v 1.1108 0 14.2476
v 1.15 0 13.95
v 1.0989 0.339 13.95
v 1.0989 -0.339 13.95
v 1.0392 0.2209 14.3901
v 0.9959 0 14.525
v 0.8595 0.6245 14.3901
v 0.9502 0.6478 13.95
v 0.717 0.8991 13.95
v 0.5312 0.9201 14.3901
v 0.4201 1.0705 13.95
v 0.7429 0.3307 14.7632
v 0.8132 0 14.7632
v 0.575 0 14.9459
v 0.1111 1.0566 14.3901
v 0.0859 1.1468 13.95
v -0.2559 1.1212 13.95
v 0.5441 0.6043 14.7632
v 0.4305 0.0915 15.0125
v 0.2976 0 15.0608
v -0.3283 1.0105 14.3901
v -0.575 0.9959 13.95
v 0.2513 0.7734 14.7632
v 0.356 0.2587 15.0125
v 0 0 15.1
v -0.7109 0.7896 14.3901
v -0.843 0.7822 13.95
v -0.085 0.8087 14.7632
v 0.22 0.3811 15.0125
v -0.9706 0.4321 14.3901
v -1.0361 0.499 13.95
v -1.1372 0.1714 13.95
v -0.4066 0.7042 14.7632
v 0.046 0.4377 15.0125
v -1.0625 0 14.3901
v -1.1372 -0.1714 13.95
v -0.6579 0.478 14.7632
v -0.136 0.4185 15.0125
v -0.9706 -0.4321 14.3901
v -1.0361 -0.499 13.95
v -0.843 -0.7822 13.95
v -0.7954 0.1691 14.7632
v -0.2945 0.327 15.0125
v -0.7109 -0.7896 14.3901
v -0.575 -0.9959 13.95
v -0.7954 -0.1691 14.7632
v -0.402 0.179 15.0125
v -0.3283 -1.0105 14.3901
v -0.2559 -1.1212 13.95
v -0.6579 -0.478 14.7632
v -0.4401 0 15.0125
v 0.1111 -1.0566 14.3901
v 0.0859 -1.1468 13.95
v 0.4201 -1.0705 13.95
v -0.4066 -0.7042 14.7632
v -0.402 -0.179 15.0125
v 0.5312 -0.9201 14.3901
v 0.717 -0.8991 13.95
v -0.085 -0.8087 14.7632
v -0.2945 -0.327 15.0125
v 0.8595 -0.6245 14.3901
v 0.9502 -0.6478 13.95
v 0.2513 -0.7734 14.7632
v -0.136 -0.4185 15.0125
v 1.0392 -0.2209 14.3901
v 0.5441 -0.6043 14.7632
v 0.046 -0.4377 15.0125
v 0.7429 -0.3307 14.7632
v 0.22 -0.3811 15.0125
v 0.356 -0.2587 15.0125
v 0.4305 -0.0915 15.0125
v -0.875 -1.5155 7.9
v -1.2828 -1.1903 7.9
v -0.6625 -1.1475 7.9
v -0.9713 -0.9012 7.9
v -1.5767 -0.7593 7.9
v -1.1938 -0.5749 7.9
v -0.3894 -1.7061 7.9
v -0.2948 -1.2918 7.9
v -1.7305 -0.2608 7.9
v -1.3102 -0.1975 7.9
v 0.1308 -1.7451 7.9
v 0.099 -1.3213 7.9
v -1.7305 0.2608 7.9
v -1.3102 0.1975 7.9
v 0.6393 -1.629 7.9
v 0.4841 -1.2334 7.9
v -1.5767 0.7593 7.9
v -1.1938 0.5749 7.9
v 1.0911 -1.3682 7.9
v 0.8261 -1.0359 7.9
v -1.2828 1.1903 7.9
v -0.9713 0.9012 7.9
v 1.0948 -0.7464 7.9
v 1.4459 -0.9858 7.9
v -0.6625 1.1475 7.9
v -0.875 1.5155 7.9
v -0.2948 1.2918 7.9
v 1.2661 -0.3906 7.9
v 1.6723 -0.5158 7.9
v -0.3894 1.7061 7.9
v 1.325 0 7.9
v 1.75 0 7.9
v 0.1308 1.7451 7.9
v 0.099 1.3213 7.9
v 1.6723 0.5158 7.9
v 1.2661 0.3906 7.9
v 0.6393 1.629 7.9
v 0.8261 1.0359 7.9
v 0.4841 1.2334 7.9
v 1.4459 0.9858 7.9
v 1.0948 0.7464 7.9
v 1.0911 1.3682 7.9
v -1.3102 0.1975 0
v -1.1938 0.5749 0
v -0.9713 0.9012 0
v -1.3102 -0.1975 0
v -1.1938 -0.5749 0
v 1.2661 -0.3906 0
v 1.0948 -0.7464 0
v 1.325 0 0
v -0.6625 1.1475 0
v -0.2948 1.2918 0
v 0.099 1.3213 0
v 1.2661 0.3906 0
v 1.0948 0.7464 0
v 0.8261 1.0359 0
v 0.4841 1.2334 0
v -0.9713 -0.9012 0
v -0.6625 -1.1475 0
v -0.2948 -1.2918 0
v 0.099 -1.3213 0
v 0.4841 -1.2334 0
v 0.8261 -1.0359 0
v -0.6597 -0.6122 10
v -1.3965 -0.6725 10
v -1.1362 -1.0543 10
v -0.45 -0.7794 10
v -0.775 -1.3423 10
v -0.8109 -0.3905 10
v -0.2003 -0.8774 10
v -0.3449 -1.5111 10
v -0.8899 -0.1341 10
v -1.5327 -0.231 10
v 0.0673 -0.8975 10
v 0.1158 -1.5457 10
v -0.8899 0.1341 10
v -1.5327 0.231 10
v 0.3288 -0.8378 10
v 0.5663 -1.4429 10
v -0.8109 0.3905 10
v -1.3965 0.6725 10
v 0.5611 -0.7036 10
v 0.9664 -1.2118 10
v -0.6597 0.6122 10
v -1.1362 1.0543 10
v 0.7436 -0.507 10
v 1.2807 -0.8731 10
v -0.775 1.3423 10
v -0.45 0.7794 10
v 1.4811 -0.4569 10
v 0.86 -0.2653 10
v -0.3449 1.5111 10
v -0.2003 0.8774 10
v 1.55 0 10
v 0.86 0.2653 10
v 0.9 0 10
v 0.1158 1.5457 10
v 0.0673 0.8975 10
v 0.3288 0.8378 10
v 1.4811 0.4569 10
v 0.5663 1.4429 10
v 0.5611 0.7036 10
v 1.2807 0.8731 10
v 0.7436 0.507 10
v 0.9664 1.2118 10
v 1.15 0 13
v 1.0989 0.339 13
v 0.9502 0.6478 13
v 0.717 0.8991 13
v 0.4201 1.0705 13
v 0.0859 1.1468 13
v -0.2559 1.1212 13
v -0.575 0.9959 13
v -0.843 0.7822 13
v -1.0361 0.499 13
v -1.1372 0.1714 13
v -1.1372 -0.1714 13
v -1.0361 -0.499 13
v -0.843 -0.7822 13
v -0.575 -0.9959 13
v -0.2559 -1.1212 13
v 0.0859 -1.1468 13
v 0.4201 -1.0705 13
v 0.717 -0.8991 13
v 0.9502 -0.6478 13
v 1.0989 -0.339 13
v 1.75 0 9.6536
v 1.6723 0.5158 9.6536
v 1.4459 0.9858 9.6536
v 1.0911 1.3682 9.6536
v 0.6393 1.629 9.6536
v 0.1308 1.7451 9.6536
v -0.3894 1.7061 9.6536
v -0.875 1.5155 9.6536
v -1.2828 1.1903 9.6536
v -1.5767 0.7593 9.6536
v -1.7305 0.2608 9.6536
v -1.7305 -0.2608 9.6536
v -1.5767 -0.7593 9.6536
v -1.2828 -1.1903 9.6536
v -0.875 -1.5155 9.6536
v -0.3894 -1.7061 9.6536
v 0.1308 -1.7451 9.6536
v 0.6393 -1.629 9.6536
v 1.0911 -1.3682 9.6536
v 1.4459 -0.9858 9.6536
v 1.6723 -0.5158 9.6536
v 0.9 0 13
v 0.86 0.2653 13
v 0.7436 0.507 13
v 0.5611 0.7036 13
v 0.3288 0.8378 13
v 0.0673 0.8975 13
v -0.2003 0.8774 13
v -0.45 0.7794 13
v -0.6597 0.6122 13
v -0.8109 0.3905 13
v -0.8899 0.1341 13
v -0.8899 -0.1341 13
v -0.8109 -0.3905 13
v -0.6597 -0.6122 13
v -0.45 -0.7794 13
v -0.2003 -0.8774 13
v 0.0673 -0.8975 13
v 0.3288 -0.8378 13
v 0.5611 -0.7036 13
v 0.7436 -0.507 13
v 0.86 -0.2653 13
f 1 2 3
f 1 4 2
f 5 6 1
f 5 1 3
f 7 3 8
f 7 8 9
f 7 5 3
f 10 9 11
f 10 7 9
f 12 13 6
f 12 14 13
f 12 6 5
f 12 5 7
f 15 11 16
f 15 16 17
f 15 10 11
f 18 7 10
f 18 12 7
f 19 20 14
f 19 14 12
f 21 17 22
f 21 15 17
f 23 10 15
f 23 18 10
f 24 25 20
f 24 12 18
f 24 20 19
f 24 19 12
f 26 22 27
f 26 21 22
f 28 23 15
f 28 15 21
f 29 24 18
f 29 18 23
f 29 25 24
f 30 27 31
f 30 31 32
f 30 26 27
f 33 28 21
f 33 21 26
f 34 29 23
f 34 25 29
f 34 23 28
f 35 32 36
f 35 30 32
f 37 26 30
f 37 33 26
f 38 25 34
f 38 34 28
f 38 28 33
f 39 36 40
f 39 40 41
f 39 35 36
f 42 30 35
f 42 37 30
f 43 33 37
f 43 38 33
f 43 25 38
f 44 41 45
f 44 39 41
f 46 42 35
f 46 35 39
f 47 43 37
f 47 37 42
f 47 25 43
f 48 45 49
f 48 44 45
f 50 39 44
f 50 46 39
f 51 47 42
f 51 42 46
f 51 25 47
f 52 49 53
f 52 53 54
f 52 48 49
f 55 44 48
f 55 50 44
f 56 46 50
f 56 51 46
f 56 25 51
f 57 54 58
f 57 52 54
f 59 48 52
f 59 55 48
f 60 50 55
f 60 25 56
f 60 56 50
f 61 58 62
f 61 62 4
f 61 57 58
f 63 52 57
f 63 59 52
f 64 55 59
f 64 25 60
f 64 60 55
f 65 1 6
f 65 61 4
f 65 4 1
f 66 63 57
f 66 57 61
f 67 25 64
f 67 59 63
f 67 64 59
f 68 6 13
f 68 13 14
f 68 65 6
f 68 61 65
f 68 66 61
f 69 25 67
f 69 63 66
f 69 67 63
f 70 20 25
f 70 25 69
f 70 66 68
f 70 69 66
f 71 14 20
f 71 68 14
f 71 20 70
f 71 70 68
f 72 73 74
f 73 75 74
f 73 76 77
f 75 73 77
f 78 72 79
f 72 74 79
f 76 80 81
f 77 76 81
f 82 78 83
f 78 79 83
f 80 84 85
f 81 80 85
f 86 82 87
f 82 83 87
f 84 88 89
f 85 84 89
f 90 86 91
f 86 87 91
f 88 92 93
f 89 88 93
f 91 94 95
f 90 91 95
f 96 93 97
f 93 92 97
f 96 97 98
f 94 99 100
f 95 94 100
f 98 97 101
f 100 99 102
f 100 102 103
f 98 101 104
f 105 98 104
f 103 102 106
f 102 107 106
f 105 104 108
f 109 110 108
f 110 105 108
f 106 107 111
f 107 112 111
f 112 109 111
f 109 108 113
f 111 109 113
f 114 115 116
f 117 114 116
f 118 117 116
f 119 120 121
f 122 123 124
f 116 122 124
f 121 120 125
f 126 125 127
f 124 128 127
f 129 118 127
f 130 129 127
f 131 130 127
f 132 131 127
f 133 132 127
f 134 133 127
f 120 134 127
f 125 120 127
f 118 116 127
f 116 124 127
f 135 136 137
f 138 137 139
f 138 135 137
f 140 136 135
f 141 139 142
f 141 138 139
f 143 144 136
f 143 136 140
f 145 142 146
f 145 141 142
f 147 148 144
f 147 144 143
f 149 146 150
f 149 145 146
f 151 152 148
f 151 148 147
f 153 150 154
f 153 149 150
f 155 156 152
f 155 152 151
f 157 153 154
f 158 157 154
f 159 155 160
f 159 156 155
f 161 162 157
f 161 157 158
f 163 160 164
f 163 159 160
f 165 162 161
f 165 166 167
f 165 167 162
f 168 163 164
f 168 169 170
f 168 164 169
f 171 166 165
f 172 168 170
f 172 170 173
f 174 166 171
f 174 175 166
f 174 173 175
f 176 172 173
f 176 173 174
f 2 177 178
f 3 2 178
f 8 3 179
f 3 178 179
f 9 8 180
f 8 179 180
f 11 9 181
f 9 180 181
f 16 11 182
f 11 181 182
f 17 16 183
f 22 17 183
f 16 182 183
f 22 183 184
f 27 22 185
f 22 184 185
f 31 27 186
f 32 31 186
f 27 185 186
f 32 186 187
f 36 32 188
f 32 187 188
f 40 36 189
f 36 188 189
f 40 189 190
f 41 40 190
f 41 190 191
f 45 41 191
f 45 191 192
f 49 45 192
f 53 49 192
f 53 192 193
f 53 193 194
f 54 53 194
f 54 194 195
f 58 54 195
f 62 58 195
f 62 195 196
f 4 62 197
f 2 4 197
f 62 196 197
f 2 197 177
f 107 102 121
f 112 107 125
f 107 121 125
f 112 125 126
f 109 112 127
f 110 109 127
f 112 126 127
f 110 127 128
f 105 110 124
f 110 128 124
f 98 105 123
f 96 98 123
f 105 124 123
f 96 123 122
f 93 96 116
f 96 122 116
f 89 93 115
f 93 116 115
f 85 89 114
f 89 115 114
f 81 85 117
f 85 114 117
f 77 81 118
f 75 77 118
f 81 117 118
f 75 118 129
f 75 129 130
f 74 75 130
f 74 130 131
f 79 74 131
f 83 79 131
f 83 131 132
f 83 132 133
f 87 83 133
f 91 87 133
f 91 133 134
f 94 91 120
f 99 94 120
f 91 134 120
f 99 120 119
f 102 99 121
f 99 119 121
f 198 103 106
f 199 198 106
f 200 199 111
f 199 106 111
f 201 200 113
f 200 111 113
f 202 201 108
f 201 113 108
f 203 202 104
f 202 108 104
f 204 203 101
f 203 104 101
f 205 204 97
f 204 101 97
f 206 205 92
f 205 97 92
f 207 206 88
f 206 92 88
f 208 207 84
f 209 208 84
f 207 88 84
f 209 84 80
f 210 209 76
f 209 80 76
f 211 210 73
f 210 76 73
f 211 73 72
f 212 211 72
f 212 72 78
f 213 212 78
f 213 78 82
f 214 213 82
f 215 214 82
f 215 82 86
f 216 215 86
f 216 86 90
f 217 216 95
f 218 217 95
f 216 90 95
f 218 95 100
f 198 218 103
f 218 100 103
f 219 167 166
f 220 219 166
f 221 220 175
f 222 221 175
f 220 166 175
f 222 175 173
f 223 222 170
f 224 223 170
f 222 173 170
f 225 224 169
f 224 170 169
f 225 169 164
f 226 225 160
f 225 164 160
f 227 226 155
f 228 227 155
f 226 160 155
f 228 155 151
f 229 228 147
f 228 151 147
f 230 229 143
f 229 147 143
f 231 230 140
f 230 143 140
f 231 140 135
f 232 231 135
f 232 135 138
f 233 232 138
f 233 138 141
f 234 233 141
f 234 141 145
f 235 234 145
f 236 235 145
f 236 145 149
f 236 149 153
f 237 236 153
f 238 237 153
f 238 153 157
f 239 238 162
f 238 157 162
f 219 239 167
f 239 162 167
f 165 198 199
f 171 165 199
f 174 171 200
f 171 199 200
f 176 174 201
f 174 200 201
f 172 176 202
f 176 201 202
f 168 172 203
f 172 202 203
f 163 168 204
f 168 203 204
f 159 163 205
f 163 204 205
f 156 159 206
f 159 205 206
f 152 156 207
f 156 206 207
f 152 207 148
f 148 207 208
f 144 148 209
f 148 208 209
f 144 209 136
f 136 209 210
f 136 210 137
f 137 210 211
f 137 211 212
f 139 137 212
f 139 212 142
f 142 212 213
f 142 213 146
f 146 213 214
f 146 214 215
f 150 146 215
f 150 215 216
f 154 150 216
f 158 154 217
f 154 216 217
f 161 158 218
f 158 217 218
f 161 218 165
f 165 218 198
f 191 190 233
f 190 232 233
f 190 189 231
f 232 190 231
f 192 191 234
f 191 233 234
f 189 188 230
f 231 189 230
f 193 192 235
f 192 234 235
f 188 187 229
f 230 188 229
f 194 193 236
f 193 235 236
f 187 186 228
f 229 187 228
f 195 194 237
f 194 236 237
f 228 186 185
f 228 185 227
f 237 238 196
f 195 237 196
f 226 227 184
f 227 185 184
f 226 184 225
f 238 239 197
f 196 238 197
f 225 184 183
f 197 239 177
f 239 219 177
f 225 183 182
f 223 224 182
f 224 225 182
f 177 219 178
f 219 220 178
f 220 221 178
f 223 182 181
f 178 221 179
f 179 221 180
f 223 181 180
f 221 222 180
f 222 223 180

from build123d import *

# Parameters (mm, degrees)
ESQUISSE1_R      = 1.325
EXTRUSION1_DEPTH = 7.9
ESQUISSE2_R      = 1.75
EXTRUSION2_DEPTH = 2.1
ESQUISSE3_R      = 0.9
EXTRUSION3_DEPTH = 3
ESQUISSE4_R      = 1.15
EXTRUSION4_DEPTH = 2.1
CONG_1_R         = 1.15
CHANFREIN1_SIZE  = 0.2
CHANFREIN1_SIZE2 = 0.346410162


with BuildPart() as part:
    # Esquisse1 → Extrusion1 (new body)
    with BuildSketch(Plane.XY):
        Circle(ESQUISSE1_R)
    extrude(amount=EXTRUSION1_DEPTH)

    # Esquisse2 → Extrusion2 (add)
    with BuildSketch(Plane.XY.offset(7.9)):
        Circle(ESQUISSE2_R)
    extrude(amount=EXTRUSION2_DEPTH)

    # Esquisse3 → Extrusion3 (add)
    with BuildSketch(Plane.XY.offset(10)):
        Circle(ESQUISSE3_R)
    extrude(amount=EXTRUSION3_DEPTH)

    # Esquisse4 → Extrusion4 (add)
    with BuildSketch(Plane.XY.offset(13)):
        Circle(ESQUISSE4_R)
    extrude(amount=EXTRUSION4_DEPTH)

    # Congé1
    cong_1_edges = [part.edges().sort_by_distance(p)[0] for p in [
        (-1.15, 0, 15.1),
    ]]
    fillet(cong_1_edges, radius=CONG_1_R)

    # Chanfrein1
    chanfrein1_edges = [part.edges().sort_by_distance(p)[0] for p in [
        (-1.75, 0, 10),
    ]]
    chanfrein1_side = [part.faces().sort_by_distance(p)[0] for p in [
        (-1.700502525, 0, 10),
    ]]
    chamfer(chanfrein1_edges, length=CHANFREIN1_SIZE, length2=CHANFREIN1_SIZE2, reference=chanfrein1_side[0])


solid = part.part
